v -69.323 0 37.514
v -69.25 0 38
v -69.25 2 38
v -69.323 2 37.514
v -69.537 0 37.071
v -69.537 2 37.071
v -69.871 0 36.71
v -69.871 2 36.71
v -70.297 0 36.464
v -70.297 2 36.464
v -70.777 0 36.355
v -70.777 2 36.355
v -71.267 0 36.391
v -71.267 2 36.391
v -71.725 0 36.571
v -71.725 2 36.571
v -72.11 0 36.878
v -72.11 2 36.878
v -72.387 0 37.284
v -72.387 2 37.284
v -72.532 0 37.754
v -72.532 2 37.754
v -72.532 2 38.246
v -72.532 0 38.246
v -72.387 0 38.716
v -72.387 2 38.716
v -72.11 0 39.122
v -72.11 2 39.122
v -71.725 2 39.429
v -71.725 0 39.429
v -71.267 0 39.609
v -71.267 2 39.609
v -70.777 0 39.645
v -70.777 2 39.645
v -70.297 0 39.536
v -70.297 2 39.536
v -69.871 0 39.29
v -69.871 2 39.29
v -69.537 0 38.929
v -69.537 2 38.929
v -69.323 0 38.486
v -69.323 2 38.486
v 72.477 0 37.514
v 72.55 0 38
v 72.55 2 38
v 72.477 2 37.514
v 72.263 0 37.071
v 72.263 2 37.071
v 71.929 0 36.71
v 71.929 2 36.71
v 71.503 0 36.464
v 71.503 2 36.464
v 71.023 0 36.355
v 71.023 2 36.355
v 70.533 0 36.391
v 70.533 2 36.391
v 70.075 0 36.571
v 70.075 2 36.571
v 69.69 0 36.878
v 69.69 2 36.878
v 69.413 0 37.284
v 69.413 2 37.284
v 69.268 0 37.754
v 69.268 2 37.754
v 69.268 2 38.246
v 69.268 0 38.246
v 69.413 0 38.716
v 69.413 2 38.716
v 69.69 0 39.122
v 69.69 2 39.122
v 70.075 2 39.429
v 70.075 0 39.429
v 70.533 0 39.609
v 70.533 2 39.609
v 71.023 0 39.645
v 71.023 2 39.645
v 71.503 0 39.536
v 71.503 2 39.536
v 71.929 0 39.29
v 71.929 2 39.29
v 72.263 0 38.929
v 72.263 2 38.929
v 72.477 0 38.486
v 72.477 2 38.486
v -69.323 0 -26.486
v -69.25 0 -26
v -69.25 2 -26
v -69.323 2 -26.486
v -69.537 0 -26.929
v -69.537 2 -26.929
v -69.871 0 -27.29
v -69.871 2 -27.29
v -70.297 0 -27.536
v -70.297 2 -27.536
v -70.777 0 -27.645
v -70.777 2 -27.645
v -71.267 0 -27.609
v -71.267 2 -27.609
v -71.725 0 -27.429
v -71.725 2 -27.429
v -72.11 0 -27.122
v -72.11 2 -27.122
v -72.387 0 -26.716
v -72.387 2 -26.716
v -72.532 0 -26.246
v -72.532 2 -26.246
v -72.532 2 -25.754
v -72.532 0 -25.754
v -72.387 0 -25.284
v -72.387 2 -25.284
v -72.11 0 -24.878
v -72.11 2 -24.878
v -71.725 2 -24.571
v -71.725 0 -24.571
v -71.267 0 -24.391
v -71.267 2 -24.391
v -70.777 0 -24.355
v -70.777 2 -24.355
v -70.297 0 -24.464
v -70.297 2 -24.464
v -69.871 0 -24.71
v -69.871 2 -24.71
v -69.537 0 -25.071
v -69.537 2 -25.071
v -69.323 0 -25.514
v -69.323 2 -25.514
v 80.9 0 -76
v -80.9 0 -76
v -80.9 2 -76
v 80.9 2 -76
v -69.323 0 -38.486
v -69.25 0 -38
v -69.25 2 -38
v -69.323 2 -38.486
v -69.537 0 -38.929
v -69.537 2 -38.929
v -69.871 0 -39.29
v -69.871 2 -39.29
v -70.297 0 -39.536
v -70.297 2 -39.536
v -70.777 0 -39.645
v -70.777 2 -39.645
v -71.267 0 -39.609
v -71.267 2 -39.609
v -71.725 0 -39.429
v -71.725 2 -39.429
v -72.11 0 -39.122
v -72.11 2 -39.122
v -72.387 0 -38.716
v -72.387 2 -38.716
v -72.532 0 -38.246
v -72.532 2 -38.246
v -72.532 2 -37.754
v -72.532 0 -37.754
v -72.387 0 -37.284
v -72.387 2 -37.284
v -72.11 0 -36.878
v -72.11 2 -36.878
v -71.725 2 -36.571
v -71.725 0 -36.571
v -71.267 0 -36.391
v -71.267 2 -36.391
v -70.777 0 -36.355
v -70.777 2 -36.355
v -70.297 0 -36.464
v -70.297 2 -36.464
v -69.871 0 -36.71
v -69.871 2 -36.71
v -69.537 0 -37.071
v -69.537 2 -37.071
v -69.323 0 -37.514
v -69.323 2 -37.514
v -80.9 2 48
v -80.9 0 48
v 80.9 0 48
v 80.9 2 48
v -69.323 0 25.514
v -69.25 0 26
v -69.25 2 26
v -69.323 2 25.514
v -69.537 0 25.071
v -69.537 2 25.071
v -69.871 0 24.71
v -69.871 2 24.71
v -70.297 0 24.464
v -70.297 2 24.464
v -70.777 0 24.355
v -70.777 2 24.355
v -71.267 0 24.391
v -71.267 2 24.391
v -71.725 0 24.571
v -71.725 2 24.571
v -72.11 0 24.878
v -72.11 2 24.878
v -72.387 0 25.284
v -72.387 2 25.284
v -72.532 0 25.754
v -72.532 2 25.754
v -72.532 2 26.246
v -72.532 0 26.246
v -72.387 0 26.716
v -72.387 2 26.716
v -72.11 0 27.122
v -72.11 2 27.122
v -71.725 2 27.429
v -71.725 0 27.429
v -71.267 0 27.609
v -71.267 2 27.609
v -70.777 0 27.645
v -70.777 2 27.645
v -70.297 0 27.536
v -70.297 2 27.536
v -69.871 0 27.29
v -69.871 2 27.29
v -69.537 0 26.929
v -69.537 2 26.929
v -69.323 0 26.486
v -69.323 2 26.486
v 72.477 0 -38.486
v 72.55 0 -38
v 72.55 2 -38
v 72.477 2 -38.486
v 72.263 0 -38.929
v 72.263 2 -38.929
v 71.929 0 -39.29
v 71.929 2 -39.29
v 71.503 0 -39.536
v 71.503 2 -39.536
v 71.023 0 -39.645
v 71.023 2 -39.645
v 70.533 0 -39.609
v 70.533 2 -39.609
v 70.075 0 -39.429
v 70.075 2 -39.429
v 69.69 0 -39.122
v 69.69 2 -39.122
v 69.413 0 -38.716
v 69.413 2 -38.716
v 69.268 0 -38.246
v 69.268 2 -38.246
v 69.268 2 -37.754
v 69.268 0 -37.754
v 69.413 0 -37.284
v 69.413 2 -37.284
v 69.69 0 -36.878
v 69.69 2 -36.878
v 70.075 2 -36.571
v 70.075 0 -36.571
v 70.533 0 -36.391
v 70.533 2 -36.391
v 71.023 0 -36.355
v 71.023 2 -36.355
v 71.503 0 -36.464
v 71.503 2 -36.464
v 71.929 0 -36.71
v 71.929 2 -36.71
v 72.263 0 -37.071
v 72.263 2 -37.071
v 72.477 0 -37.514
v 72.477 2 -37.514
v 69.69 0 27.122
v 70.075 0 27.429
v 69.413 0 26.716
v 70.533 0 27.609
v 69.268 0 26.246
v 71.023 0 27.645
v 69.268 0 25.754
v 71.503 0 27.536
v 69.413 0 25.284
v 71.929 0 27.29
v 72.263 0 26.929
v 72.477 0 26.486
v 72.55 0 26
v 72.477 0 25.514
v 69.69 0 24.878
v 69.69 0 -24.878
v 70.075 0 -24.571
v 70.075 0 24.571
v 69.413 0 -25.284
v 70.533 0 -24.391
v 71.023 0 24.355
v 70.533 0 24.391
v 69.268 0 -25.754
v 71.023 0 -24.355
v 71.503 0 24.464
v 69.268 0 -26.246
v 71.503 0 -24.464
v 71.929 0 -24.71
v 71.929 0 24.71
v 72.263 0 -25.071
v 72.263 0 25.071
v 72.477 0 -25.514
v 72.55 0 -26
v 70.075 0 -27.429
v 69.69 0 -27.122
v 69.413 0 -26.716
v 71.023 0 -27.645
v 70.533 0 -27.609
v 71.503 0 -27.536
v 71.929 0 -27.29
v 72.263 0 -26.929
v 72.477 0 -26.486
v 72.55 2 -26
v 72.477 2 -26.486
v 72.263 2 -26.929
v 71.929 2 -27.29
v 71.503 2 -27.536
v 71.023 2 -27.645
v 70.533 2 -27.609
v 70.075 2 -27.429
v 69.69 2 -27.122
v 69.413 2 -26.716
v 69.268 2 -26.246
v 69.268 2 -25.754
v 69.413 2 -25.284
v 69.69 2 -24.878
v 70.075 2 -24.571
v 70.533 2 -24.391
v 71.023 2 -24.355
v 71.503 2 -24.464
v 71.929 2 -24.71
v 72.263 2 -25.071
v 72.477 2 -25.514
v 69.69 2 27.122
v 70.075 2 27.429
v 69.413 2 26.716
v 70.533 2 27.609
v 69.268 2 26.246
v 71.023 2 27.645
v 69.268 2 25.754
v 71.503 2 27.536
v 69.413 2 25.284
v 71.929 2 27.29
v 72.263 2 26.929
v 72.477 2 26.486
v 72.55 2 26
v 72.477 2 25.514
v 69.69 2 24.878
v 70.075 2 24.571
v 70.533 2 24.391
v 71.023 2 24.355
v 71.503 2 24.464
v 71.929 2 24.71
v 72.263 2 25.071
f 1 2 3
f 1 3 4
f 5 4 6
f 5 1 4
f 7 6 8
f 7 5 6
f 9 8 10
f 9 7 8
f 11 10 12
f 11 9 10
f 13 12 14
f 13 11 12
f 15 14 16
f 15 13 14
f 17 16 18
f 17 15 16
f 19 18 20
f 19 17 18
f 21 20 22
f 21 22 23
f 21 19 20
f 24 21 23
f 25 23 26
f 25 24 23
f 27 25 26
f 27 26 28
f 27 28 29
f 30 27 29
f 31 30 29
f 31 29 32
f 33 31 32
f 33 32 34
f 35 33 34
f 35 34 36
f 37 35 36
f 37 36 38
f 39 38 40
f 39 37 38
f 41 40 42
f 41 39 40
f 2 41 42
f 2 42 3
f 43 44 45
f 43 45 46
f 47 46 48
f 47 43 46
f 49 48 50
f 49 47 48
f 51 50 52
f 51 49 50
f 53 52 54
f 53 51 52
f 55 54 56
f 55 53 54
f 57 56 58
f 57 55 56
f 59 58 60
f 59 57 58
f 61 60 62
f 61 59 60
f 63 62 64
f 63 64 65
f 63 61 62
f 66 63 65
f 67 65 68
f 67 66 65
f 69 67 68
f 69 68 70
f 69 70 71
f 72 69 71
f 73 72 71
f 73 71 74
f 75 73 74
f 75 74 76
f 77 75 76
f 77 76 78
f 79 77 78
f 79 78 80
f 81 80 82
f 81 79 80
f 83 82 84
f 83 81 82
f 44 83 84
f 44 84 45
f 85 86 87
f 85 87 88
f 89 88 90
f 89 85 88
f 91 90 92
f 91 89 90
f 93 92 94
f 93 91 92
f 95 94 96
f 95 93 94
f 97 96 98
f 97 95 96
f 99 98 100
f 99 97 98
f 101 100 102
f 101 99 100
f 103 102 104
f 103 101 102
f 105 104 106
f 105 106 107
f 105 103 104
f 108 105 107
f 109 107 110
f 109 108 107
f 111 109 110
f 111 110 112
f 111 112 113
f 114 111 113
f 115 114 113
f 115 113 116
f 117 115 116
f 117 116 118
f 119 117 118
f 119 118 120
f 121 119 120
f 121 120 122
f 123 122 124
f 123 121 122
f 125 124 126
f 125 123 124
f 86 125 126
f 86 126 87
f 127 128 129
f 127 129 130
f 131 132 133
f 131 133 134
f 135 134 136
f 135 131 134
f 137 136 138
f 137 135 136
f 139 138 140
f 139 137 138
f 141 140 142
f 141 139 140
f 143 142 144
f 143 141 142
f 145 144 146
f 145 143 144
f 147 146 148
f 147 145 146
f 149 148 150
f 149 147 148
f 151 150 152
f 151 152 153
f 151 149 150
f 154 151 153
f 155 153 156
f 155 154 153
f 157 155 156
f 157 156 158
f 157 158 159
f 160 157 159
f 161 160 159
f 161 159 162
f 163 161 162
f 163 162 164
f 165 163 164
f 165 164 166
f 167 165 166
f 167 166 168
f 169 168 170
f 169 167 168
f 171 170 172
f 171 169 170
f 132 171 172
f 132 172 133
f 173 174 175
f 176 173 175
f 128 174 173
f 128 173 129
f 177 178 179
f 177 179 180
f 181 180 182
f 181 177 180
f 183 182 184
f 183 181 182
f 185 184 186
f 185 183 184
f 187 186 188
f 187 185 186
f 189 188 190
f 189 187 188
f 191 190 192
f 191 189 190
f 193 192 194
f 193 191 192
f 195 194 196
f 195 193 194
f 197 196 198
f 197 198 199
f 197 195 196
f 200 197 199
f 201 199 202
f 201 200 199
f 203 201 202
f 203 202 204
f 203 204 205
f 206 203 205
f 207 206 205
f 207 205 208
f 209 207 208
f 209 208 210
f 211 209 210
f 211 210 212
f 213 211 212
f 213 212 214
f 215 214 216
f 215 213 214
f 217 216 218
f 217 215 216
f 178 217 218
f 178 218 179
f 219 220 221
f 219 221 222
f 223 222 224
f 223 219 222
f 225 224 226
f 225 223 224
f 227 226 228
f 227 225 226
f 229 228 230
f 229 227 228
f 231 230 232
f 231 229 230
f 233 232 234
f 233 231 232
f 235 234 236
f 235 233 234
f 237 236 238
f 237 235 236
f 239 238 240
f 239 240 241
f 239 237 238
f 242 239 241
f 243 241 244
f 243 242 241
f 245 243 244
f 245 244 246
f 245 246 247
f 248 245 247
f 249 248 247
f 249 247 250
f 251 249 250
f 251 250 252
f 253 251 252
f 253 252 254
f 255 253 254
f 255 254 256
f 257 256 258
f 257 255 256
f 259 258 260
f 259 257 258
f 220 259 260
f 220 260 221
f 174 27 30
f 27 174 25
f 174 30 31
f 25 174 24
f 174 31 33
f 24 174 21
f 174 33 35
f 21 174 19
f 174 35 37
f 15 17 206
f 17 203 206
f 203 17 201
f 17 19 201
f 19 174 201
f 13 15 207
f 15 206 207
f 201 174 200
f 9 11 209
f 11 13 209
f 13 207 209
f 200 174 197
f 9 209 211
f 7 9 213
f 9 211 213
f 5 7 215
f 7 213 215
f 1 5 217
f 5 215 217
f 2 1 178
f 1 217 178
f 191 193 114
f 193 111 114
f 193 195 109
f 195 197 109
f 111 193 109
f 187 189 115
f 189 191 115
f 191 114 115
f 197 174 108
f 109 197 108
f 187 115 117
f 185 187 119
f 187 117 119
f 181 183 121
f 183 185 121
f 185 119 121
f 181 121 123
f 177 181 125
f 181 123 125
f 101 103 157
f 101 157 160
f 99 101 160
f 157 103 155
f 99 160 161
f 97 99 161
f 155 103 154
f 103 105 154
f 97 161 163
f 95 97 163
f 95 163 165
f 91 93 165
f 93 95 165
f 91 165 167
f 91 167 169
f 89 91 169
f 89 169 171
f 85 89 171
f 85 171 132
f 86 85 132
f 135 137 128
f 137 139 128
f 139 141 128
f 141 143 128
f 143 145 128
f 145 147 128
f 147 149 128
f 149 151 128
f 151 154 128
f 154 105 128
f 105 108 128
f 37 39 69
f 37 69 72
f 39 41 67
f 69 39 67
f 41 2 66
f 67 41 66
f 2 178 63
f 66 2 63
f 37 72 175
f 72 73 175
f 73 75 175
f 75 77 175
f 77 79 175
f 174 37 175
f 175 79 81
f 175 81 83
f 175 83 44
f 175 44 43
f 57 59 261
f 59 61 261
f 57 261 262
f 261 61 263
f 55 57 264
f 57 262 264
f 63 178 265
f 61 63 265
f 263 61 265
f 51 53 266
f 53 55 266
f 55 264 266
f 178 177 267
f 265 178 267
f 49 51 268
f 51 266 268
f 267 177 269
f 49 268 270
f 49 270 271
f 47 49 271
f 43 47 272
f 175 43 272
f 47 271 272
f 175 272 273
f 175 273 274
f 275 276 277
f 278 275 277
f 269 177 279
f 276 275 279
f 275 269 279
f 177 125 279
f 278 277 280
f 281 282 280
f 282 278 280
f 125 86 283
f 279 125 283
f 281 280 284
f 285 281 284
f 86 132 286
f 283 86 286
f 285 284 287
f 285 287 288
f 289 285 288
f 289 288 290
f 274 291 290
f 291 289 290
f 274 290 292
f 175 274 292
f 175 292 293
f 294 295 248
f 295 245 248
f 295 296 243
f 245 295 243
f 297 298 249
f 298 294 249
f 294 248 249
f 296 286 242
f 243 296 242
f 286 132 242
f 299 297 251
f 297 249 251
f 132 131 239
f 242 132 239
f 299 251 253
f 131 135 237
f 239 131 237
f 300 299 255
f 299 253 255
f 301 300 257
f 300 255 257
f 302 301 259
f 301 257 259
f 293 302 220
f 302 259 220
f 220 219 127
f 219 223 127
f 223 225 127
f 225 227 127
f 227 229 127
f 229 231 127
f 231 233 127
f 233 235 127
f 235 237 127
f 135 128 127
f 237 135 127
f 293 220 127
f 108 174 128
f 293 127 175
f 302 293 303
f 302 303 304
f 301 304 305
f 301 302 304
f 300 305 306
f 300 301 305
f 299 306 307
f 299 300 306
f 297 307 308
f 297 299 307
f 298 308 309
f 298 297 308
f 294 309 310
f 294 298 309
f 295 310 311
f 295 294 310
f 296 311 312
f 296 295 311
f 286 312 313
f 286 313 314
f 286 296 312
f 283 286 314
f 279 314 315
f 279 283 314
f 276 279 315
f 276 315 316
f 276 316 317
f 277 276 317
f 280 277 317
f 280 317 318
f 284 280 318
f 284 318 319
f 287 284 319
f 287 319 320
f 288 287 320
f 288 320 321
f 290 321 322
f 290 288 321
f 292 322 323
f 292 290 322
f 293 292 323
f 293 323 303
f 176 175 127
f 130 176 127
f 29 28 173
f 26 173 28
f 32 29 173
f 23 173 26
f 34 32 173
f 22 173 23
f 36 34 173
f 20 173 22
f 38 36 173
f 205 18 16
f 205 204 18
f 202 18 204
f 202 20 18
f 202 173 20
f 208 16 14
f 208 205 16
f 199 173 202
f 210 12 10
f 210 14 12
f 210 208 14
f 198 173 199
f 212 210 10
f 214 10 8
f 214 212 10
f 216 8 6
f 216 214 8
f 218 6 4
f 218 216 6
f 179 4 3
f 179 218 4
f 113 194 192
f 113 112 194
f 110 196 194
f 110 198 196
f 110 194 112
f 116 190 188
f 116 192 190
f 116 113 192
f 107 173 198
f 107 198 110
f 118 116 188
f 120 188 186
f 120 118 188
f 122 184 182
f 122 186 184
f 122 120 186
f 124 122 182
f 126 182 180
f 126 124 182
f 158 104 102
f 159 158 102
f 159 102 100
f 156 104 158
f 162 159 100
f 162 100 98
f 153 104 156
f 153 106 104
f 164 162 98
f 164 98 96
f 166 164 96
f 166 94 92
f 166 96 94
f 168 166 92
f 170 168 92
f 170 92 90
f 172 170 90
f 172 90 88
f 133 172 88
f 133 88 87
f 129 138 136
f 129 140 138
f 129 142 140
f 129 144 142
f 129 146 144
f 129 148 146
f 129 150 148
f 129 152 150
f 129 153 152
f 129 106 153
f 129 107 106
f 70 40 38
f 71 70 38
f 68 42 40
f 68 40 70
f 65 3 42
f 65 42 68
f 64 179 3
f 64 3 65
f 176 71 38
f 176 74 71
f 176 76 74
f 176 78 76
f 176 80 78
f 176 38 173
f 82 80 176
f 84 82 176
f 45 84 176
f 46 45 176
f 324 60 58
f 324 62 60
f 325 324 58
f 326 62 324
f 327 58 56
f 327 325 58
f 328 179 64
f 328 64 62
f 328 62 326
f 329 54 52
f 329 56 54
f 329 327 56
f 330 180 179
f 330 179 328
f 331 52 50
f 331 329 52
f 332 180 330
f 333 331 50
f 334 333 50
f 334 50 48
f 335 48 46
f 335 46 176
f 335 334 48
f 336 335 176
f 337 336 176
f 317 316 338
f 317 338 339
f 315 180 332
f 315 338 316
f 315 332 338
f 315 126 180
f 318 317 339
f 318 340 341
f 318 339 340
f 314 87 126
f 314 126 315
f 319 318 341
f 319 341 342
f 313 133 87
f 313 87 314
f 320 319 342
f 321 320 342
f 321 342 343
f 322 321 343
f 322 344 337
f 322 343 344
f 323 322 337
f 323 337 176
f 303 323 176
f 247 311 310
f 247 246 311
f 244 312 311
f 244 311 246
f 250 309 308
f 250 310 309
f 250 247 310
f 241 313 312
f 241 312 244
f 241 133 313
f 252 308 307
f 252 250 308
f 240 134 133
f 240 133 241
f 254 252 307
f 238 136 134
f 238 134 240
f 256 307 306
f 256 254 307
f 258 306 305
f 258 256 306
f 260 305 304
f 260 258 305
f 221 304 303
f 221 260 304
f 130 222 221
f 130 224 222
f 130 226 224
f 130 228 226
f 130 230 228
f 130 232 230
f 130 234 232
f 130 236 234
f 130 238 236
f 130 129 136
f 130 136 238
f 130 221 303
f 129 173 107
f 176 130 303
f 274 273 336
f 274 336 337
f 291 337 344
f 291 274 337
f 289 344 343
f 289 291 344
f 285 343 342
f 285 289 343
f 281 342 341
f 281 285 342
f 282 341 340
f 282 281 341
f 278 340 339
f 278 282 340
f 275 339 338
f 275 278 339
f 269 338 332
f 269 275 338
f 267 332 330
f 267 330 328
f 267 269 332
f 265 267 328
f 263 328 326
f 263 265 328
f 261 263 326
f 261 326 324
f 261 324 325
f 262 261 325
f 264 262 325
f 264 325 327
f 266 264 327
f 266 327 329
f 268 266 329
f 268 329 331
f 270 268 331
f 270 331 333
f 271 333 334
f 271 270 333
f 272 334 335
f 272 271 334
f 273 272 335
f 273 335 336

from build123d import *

# Parameters (mm, degrees)
SKETCH1_W           = 161.8
SKETCH1_H           = 124
SKETCH1_R           = 1.65
BOSS_EXTRUDE1_DEPTH = 2


with BuildPart() as part:
    # Sketch1 → Boss-Extrude1 (new body)
    with BuildSketch(Plane(origin=(0, 0, 0), x_dir=(1, 0, 0), z_dir=(0, 1, 0))):
        with Locations((0, 14)):
            Rectangle(SKETCH1_W, SKETCH1_H)
        with Locations((-70.9, 38)):
            Circle(SKETCH1_R, mode=Mode.SUBTRACT)
        with Locations((-70.9, 26)):
            Circle(SKETCH1_R, mode=Mode.SUBTRACT)
        with Locations((-70.9, -26)):
            Circle(SKETCH1_R, mode=Mode.SUBTRACT)
        with Locations((-70.9, -38)):
            Circle(SKETCH1_R, mode=Mode.SUBTRACT)
        with Locations((70.9, 38)):
            Circle(SKETCH1_R, mode=Mode.SUBTRACT)
        with Locations((70.9, 26)):
            Circle(SKETCH1_R, mode=Mode.SUBTRACT)
        with Locations((70.9, -26)):
            Circle(SKETCH1_R, mode=Mode.SUBTRACT)
        with Locations((70.9, -38)):
            Circle(SKETCH1_R, mode=Mode.SUBTRACT)
    extrude(amount=BOSS_EXTRUDE1_DEPTH)


solid = part.part
